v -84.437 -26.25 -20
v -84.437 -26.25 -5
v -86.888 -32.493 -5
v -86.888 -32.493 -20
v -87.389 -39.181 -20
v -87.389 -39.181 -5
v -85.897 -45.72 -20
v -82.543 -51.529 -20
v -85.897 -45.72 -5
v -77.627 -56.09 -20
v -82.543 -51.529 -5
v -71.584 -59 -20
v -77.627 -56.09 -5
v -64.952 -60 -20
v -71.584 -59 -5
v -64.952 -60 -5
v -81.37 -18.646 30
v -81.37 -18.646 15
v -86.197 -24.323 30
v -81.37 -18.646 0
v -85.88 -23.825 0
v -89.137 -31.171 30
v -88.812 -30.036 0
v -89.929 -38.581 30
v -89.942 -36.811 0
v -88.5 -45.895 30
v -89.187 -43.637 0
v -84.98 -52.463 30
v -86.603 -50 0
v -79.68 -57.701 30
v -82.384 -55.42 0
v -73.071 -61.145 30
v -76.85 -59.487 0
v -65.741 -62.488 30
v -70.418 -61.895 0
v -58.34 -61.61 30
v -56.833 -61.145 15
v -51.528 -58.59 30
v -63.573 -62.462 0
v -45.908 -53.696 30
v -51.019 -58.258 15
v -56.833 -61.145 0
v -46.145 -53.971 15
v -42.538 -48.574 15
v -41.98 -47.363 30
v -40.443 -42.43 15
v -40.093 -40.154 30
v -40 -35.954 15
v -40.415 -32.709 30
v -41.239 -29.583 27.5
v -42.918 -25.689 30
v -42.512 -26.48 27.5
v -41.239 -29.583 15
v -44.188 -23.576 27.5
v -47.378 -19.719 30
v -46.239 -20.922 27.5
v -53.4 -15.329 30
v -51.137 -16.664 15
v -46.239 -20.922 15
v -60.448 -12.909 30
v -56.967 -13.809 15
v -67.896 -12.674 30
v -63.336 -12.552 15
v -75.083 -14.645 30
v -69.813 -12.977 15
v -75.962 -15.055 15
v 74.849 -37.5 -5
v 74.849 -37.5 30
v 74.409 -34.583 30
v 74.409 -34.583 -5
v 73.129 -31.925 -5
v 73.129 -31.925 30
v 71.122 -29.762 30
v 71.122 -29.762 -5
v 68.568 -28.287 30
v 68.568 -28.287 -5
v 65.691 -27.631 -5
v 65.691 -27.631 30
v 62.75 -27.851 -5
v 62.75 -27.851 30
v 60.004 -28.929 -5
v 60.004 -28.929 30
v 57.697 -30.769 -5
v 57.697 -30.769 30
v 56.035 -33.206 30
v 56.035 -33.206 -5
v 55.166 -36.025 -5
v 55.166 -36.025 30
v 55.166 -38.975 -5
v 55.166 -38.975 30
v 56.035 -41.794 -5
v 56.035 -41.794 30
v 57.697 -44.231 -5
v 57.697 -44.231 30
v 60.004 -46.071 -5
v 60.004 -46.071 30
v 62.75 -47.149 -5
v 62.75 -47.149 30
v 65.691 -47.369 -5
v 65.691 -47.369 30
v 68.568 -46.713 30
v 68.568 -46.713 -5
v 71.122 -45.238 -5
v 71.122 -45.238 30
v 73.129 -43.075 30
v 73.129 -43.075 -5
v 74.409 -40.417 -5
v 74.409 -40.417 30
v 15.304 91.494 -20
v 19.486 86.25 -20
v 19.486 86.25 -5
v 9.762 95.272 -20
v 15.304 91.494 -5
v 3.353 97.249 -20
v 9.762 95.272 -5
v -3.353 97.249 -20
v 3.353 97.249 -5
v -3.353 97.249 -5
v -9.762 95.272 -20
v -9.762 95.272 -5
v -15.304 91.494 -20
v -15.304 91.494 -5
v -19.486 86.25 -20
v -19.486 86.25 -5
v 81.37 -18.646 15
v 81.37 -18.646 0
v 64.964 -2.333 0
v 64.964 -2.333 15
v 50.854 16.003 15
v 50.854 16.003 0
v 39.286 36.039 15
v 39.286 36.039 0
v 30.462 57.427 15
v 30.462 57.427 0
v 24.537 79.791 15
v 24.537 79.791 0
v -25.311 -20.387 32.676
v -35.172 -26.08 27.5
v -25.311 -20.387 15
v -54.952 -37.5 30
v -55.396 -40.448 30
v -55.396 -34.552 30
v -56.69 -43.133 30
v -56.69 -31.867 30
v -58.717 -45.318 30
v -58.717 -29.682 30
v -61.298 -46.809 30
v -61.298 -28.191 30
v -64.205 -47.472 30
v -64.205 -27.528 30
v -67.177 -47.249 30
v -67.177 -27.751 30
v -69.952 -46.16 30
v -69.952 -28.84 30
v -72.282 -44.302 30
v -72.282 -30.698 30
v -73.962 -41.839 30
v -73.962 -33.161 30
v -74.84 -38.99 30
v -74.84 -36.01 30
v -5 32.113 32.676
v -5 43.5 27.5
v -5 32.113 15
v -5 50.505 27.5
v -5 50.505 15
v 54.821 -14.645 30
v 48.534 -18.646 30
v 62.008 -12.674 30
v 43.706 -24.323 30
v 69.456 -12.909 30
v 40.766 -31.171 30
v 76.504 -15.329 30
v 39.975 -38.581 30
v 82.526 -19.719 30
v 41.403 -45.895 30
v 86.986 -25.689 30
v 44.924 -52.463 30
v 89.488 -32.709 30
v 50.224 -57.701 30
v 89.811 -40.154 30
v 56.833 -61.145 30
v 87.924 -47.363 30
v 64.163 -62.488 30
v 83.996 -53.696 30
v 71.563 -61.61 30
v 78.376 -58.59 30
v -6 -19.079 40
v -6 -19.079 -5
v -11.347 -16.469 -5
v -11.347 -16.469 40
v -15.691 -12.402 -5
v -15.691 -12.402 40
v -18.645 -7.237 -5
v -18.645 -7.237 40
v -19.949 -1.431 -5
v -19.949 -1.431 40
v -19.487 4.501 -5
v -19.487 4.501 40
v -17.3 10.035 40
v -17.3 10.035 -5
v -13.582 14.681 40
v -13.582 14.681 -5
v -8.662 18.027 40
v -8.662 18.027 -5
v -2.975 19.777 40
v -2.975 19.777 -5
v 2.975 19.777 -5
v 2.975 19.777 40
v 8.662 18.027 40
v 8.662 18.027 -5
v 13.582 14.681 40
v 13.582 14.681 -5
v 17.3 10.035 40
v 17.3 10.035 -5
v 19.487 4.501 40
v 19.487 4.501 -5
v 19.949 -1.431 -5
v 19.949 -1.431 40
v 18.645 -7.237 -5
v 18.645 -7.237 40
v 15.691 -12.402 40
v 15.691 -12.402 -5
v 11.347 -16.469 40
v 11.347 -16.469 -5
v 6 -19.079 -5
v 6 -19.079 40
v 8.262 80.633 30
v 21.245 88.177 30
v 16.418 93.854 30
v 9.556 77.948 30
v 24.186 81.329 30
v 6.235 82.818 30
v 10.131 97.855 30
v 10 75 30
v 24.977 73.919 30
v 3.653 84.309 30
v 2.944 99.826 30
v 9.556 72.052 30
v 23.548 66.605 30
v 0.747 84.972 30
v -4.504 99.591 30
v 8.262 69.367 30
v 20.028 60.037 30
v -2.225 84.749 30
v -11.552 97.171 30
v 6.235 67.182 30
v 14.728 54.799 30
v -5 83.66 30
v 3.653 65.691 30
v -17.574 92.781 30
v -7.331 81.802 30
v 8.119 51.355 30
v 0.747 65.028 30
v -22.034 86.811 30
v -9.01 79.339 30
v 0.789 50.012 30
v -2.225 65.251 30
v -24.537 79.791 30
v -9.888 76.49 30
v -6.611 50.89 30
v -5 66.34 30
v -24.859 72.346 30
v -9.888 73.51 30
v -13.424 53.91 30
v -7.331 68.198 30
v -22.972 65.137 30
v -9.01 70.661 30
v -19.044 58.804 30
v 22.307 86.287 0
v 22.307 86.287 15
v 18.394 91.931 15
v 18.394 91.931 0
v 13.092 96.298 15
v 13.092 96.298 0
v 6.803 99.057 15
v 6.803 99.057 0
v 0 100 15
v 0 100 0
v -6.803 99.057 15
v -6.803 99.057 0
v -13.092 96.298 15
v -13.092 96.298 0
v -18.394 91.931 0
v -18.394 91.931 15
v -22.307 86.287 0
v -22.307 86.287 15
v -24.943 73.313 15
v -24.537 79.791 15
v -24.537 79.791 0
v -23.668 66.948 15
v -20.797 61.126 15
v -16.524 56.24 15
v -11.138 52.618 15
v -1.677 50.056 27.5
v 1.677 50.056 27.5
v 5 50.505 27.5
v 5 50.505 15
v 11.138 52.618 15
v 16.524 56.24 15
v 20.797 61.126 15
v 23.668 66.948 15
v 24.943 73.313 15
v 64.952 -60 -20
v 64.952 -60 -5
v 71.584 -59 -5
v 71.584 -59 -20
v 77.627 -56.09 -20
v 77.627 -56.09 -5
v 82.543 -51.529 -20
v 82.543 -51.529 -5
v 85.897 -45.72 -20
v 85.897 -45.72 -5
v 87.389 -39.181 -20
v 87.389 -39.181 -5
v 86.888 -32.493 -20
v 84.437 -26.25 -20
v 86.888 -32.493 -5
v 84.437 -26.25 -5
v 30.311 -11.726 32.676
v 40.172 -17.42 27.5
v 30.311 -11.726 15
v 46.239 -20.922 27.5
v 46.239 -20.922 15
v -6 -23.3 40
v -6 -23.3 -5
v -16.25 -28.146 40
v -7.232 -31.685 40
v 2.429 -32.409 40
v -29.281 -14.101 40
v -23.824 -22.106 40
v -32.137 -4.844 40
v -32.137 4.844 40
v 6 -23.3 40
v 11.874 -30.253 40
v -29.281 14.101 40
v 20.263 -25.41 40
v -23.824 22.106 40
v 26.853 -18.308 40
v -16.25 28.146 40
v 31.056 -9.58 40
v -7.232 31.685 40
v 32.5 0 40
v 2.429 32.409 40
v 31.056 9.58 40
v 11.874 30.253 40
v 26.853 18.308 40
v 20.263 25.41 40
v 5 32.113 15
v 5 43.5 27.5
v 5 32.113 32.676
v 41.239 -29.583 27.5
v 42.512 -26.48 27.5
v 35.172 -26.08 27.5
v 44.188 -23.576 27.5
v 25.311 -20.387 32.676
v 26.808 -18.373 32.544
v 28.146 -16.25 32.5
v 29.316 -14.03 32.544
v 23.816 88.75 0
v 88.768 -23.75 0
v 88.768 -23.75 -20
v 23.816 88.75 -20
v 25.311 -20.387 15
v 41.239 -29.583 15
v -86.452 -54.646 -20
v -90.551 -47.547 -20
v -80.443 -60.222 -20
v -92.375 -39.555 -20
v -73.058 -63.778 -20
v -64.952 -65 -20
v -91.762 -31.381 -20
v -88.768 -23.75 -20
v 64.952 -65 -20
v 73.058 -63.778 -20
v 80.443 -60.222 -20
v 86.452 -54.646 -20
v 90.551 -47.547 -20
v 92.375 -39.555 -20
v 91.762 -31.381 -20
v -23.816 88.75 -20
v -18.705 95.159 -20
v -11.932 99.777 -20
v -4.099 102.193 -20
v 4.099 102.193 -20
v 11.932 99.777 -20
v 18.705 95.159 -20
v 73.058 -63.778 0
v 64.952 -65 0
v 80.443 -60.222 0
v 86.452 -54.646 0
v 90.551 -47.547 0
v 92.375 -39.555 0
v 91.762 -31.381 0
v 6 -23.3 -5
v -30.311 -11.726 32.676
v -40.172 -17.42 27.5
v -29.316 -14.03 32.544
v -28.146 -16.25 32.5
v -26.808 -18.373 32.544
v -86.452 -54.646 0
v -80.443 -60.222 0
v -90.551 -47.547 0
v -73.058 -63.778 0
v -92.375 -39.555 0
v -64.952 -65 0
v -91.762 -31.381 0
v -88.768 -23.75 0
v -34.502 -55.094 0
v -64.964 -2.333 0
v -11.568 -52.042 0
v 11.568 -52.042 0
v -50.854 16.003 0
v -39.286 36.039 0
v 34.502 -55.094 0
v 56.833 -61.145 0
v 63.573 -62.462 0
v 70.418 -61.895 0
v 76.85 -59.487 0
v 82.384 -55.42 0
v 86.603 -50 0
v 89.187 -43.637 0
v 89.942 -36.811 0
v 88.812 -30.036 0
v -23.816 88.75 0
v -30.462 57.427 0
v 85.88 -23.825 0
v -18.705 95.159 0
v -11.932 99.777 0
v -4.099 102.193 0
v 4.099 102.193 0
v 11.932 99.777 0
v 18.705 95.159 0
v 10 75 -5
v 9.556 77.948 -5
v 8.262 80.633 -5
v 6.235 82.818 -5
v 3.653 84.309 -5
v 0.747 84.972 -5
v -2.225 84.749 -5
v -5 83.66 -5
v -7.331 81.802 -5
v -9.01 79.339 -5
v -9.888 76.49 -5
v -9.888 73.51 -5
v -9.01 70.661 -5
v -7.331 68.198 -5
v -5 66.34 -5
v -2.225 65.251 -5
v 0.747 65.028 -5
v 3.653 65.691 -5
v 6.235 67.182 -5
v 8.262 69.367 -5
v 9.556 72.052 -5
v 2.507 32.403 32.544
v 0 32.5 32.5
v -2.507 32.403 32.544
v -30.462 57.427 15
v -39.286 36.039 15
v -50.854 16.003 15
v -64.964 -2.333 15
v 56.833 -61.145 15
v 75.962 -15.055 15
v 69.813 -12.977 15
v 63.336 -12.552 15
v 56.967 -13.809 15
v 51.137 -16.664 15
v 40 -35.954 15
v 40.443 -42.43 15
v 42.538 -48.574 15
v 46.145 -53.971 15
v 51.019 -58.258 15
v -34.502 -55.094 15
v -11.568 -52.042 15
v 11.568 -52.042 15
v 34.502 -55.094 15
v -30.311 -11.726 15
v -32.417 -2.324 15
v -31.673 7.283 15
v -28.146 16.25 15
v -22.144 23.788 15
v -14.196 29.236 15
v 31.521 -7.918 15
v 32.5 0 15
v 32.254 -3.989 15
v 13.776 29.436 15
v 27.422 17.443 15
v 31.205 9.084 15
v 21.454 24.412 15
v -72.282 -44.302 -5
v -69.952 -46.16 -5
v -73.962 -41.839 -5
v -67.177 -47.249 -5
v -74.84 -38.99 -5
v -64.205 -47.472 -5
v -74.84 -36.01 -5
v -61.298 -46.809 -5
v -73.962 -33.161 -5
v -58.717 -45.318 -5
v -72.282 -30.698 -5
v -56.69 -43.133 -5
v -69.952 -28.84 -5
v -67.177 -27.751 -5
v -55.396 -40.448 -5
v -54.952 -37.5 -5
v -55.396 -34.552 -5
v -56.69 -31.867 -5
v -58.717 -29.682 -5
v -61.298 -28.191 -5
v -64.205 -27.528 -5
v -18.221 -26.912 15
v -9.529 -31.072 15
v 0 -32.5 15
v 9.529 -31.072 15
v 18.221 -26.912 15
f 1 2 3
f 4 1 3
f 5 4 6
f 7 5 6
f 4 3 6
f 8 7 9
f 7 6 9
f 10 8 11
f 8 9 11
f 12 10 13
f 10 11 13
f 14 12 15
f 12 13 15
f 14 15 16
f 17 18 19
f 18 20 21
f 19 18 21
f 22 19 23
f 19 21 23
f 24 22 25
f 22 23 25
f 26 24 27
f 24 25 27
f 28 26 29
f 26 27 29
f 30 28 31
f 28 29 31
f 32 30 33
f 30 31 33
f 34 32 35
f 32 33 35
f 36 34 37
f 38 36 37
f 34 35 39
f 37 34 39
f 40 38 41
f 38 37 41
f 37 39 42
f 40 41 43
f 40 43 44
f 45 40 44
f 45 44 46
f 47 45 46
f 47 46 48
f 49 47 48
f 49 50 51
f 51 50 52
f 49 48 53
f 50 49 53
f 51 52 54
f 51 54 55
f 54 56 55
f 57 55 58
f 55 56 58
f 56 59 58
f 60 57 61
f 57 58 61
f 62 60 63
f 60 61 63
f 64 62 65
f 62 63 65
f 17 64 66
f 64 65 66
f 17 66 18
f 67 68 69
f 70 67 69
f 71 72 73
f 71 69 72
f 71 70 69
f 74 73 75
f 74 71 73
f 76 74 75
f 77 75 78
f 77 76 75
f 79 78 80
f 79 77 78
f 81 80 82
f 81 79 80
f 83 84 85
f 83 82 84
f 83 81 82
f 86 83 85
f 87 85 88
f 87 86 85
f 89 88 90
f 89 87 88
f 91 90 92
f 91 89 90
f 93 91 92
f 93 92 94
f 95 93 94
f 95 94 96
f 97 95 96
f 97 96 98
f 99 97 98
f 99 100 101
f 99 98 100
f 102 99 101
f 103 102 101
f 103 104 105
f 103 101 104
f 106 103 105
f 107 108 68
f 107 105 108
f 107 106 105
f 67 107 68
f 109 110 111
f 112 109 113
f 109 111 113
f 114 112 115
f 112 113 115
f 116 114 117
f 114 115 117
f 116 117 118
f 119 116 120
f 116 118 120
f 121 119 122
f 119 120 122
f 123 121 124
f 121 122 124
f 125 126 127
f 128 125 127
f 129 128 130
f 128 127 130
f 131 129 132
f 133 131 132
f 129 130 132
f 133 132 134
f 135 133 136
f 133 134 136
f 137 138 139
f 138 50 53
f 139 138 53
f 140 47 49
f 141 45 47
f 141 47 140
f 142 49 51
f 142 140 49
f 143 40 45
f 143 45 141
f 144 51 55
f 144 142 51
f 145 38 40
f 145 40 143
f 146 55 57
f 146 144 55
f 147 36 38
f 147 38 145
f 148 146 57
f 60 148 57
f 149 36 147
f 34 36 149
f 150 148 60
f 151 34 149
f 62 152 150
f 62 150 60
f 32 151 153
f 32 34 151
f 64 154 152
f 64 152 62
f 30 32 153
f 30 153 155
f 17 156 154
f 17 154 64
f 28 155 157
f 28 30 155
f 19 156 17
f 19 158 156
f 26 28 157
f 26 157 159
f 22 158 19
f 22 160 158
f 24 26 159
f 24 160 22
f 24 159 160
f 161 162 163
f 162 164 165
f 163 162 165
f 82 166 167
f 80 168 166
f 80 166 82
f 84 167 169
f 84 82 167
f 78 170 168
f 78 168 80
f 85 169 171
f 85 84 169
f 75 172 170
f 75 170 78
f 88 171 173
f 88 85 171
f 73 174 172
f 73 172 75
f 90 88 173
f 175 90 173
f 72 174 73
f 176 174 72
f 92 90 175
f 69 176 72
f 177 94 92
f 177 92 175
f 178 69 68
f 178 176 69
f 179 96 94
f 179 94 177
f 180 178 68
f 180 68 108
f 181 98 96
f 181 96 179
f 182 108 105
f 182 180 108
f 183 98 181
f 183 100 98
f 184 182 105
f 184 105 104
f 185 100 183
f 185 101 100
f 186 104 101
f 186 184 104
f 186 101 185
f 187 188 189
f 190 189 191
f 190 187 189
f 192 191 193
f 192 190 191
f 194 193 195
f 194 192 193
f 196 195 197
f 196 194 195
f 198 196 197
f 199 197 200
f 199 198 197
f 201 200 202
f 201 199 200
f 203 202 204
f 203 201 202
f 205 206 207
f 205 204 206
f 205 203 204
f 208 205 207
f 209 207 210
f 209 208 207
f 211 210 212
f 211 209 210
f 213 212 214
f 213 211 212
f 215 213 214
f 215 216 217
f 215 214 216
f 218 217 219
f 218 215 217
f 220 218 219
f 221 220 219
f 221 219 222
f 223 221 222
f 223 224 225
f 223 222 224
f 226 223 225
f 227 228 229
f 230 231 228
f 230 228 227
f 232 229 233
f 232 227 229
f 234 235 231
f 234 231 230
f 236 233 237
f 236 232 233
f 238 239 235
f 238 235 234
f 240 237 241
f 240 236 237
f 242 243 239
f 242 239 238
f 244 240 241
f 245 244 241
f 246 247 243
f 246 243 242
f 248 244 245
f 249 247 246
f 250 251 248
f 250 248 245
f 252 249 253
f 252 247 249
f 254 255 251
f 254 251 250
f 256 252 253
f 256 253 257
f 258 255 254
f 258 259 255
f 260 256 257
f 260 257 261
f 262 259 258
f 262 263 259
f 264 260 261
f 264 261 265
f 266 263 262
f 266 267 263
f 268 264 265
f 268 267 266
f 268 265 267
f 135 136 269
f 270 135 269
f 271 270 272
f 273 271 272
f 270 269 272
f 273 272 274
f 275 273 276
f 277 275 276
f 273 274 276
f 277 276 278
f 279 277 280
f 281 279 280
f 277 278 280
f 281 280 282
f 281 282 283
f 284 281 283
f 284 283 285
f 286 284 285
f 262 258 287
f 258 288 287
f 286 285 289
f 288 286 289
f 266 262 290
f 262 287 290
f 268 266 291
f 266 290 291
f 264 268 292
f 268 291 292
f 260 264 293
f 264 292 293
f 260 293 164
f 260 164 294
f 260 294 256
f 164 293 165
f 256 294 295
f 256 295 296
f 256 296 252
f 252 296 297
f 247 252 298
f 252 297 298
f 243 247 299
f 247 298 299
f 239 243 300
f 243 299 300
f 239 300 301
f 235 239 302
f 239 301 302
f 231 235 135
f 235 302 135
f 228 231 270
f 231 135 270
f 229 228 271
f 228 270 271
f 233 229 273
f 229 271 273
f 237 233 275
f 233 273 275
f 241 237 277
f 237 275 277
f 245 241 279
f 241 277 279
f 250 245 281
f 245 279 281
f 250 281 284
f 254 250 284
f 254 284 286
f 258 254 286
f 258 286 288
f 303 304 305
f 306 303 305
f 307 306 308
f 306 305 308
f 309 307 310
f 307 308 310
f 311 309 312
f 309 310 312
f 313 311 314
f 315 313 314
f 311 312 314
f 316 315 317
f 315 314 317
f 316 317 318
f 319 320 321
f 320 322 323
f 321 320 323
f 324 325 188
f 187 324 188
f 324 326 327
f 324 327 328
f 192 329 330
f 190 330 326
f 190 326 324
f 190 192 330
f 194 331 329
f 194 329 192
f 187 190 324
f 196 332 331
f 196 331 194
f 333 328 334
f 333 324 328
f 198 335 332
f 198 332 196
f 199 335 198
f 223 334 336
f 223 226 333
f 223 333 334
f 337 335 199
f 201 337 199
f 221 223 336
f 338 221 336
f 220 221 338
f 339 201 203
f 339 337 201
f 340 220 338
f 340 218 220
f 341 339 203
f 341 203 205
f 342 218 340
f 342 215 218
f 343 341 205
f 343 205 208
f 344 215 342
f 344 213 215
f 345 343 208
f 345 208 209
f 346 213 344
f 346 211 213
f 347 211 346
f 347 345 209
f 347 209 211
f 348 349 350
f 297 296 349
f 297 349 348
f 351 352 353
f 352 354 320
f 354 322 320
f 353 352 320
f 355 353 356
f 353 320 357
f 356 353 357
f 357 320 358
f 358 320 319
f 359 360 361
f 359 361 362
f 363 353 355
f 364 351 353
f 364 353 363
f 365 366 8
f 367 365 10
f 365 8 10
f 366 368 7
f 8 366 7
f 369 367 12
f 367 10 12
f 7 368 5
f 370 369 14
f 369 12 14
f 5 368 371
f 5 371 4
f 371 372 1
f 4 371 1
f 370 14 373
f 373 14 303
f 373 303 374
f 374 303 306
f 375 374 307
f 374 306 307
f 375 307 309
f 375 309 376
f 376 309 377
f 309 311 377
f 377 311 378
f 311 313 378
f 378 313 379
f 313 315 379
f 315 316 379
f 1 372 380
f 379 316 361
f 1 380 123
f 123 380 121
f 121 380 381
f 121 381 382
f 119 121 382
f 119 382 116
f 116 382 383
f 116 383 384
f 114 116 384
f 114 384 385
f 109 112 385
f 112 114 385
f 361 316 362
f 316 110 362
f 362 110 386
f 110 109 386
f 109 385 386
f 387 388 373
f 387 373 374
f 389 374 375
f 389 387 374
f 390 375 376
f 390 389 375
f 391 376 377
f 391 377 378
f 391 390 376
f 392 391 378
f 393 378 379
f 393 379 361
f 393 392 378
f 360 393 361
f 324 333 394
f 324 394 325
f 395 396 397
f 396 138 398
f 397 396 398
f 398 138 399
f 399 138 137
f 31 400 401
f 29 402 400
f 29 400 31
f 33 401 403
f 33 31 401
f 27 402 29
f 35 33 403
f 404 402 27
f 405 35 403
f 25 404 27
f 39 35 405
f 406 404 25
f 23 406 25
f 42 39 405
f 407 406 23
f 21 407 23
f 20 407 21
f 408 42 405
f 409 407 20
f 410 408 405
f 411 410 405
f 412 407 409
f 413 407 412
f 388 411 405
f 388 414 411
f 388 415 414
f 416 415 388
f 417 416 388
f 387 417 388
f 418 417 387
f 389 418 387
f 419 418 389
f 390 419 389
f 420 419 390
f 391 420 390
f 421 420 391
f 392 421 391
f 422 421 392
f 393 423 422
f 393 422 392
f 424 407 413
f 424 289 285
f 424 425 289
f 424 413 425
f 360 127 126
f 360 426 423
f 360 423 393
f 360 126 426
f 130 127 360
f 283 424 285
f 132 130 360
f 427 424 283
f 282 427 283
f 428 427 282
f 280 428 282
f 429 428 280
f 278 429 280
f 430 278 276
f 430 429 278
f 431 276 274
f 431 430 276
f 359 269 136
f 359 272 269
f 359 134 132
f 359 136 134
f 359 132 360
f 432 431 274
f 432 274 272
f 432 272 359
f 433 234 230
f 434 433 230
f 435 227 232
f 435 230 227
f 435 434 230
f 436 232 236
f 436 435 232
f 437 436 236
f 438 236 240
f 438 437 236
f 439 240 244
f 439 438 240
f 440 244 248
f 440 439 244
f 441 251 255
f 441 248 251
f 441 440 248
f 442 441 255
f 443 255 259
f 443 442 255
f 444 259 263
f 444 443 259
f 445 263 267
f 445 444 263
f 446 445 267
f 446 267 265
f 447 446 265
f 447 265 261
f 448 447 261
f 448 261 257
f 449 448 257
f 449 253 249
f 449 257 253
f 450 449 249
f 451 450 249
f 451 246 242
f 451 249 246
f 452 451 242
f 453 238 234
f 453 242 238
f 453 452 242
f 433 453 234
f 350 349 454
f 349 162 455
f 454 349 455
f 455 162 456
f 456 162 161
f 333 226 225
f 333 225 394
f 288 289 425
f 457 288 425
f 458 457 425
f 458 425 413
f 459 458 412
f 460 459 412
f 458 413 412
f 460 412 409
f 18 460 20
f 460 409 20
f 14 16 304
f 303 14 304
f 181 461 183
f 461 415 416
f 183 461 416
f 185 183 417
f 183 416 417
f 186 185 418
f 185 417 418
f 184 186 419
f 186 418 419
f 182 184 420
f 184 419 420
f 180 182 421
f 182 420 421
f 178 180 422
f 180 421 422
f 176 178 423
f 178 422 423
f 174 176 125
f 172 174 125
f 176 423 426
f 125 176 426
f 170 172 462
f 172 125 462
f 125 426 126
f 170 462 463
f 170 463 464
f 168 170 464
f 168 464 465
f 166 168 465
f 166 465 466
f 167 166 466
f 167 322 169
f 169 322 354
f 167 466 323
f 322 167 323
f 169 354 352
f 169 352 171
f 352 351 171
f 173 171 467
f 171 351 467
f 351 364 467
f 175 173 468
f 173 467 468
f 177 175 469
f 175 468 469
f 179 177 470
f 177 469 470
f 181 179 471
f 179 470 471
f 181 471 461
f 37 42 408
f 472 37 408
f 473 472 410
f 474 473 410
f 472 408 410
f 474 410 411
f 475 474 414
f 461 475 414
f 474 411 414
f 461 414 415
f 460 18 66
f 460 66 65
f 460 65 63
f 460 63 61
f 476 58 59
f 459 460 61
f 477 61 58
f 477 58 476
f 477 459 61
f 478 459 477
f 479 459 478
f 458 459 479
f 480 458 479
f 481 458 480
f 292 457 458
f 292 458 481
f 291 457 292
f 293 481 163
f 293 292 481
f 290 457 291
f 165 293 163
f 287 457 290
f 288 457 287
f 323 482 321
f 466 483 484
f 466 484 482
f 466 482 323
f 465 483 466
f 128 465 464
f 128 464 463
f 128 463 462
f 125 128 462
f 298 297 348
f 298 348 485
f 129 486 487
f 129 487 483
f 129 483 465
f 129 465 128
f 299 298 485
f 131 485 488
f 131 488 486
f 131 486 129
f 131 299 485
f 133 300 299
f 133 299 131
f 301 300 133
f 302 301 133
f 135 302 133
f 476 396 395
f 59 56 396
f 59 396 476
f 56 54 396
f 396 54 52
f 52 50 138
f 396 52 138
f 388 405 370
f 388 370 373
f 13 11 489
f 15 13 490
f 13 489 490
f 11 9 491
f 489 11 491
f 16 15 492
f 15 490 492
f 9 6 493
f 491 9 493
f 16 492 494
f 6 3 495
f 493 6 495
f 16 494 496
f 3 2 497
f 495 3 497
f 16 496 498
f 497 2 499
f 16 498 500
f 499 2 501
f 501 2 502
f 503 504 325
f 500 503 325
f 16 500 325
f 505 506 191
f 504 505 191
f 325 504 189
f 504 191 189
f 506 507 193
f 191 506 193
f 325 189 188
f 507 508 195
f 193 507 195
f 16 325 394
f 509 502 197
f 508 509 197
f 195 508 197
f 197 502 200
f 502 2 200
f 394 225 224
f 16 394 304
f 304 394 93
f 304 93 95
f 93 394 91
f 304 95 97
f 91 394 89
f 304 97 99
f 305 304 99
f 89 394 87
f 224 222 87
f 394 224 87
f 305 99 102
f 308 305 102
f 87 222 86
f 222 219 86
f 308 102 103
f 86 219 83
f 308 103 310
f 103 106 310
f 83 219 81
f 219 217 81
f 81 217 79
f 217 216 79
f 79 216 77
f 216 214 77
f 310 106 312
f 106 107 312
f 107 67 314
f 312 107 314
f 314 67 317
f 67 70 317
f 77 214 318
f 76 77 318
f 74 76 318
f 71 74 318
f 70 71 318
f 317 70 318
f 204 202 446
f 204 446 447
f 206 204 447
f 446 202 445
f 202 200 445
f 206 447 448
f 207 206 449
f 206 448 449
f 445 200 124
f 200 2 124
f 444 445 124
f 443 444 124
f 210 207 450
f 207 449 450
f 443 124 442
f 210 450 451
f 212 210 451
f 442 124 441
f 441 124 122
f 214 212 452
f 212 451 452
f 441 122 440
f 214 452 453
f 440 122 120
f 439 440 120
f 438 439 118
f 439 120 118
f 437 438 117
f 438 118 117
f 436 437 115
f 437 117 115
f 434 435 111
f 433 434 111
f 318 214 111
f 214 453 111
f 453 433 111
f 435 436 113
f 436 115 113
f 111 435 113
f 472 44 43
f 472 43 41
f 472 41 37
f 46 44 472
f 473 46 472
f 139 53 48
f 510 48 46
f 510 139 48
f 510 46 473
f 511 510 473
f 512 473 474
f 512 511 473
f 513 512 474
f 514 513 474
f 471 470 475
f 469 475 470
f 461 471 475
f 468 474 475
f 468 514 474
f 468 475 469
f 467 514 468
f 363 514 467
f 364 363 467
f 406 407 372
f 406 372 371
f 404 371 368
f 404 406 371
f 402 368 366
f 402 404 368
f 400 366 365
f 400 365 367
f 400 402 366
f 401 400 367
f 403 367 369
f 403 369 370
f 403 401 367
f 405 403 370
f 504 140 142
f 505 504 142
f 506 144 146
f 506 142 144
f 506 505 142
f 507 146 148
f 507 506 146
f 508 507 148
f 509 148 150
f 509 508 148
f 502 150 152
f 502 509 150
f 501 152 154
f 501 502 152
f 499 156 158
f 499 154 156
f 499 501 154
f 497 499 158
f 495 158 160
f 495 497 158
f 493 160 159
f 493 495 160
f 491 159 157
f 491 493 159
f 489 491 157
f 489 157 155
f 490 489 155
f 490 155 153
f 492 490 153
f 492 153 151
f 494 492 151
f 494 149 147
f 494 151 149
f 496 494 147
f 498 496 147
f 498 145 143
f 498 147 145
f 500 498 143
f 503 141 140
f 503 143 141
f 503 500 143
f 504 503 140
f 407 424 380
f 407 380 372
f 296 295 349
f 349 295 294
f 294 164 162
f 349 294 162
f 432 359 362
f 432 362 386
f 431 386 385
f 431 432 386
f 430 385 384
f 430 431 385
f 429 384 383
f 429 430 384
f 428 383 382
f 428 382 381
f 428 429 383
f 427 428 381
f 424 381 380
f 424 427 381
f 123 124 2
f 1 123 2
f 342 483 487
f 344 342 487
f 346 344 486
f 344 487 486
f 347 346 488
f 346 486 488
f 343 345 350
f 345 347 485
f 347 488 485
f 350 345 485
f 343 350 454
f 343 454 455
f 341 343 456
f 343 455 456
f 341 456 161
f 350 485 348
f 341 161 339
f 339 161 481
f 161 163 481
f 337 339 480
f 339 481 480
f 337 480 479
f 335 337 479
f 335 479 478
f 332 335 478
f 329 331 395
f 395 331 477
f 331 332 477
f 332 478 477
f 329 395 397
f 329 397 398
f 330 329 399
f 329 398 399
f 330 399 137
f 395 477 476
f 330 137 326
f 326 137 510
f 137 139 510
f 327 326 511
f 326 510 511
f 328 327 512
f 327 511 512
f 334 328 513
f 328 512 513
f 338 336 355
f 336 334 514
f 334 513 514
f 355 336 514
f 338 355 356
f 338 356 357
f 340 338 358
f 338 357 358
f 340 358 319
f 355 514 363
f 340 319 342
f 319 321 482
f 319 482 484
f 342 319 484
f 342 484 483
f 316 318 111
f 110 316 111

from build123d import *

# Parameters (mm, degrees)
BOSS_EXTRUDE2_DEPTH     = 15
SKETCH1_6_R             = 25
BOSS_EXTRUDE3_DEPTH     = 30
SKETCH1_7_R             = 32.5
BOSS_EXTRUDE4_DEPTH     = 40
BOSS_EXTRUDE5_DEPTH     = 20
SHELL1_T                = -5
RIB1_START              = -5
RIB1_DEPTH              = 10
CIRPATTERN1_COUNT       = 3
CUT_EXTRUDE1_DEPTH      = 144.713620755
CUT_EXTRUDE1_DEPTH_BACK = 144.713620755
SKETCH1_8_R             = 10
SKETCH1_8_R_2           = 9.896657658
KEYWAY_DEPTH            = 161.809545085


# Read off the part's stored shape, not the designer's step: Rib1
with BuildPart() as part:
    # Sketch1 → Boss-Extrude2 (new body)
    with BuildSketch(Plane.XY):
        with BuildLine():
            ThreePointArc((24.536591615, 79.791207774), (0, 100), (-24.536591615, 79.791207774))
            ThreePointArc((-24.536591615, 79.791207774), (-44.738287256, 25.82966219), (-81.369508738, -18.646292226))
            ThreePointArc((-81.369508738, -18.646292226), (-86.602540378, -50), (-56.832917123, -61.144915548))
            ThreePointArc((-56.832917123, -61.144915548), (0, -51.65932438), (56.832917123, -61.144915548))
            ThreePointArc((56.832917123, -61.144915548), (86.602540378, -50), (81.369508738, -18.646292226))
            ThreePointArc((81.369508738, -18.646292226), (44.738287256, 25.82966219), (24.536591615, 79.791207774))
        make_face()
    extrude(amount=BOSS_EXTRUDE2_DEPTH)

    # Sketch1<6> → Boss-Extrude3 (add)
    with BuildSketch(Plane.XY):
        with Locations(Location((0, 75, 0), (0, 0, 168.951006611))):
            Circle(SKETCH1_6_R)
        with Locations(Location((64.951905284, -37.5, 0), (0, 0, 251.048993389))):
            Circle(SKETCH1_6_R)
        with Locations(Location((-64.951905284, -37.5, 0), (0, 0, 131.048993389))):
            Circle(SKETCH1_6_R)
    extrude(amount=BOSS_EXTRUDE3_DEPTH)

    # Sketch1<7> → Boss-Extrude4 (add)
    with BuildSketch(Plane.XY):
        Circle(SKETCH1_7_R)
    extrude(amount=BOSS_EXTRUDE4_DEPTH)


with BuildPart() as body_2:
    # Sketch2 → Boss-Extrude5 (new body)
    with BuildSketch(Plane(origin=(0, 0, 0), x_dir=(-1, 0, 0), z_dir=(0, 0, -1))):
        with BuildLine():
            Line((-88.767603888, -23.75), (-23.815698604, 88.75))
            ThreePointArc((-23.815698604, 88.75), (0, 102.5), (23.815698604, 88.75))
            Line((23.815698604, 88.75), (88.767603888, -23.75))
            ThreePointArc((88.767603888, -23.75), (88.767603888, -51.25), (64.951905284, -65))
            Line((64.951905284, -65), (-64.951905284, -65))
            ThreePointArc((-64.951905284, -65), (-88.767603888, -51.25), (-88.767603888, -23.75))
        make_face()
    extrude(amount=BOSS_EXTRUDE5_DEPTH)

    # Shell1
    shell1_openings = [body_2.faces().sort_by_distance(p)[0] for p in [
        (0, 0, -20),
    ]]
    offset(amount=SHELL1_T, openings=shell1_openings, kind=Kind.INTERSECTION)

    # Combine1: union part
    add(part.part)

    # Rib1 outline → Rib1 (add)
    with BuildSketch(Plane(origin=(0, 0, 0), x_dir=(0, 0, -1), z_dir=(1, 0, 0)).offset(RIB1_START)):
        Polygon((-27.5, 52), (-27.5, 43.5), (-32.67587207, 32.113081447), (-33.181818182, 31), (-15, 31), (-15, 52), align=None)
    rib1 = extrude(amount=RIB1_DEPTH)

    # CirPattern1: Rib1 ×3 about axis
    cirpattern1_axis = Axis((0, 0, 0), (0, 0, 1))
    for i in range(1, CIRPATTERN1_COUNT):
        add(rib1.rotate(cirpattern1_axis, i * 360 / CIRPATTERN1_COUNT))

    # Sketch1<8> → Cut-Extrude1 (cut, two sides: drawn at the far end of the back side and taken through both)
    with BuildSketch(Plane.XY.offset(-CUT_EXTRUDE1_DEPTH_BACK)):
        with Locations((0, 75)):
            Circle(SKETCH1_8_R)
        with Locations((-64.951905284, -37.5)):
            Circle(SKETCH1_8_R)
        with Locations((64.951905284, -37.5)):
            Circle(SKETCH1_8_R_2)
    extrude(amount=CUT_EXTRUDE1_DEPTH + CUT_EXTRUDE1_DEPTH_BACK, mode=Mode.SUBTRACT)

    # KeySketch → Keyway (cut, through all)
    with BuildSketch(Plane(origin=(-6.035211163, -9.571395477, 40), x_dir=(1, 0, 0), z_dir=(0, 0, 1))):
        with BuildLine():
            Line((12.035211163, -9.507388551), (12.035211163, -13.728604523))
            Line((12.035211163, -13.728604523), (0.035211163, -13.728604523))
            Line((0.035211163, -13.728604523), (0.035211163, -9.507388551))
            ThreePointArc((0.035211163, -9.507388551), (6.035211163, 29.571395477), (12.035211163, -9.507388551))
        make_face()
    extrude(amount=-KEYWAY_DEPTH, mode=Mode.SUBTRACT)


solid = body_2.part
